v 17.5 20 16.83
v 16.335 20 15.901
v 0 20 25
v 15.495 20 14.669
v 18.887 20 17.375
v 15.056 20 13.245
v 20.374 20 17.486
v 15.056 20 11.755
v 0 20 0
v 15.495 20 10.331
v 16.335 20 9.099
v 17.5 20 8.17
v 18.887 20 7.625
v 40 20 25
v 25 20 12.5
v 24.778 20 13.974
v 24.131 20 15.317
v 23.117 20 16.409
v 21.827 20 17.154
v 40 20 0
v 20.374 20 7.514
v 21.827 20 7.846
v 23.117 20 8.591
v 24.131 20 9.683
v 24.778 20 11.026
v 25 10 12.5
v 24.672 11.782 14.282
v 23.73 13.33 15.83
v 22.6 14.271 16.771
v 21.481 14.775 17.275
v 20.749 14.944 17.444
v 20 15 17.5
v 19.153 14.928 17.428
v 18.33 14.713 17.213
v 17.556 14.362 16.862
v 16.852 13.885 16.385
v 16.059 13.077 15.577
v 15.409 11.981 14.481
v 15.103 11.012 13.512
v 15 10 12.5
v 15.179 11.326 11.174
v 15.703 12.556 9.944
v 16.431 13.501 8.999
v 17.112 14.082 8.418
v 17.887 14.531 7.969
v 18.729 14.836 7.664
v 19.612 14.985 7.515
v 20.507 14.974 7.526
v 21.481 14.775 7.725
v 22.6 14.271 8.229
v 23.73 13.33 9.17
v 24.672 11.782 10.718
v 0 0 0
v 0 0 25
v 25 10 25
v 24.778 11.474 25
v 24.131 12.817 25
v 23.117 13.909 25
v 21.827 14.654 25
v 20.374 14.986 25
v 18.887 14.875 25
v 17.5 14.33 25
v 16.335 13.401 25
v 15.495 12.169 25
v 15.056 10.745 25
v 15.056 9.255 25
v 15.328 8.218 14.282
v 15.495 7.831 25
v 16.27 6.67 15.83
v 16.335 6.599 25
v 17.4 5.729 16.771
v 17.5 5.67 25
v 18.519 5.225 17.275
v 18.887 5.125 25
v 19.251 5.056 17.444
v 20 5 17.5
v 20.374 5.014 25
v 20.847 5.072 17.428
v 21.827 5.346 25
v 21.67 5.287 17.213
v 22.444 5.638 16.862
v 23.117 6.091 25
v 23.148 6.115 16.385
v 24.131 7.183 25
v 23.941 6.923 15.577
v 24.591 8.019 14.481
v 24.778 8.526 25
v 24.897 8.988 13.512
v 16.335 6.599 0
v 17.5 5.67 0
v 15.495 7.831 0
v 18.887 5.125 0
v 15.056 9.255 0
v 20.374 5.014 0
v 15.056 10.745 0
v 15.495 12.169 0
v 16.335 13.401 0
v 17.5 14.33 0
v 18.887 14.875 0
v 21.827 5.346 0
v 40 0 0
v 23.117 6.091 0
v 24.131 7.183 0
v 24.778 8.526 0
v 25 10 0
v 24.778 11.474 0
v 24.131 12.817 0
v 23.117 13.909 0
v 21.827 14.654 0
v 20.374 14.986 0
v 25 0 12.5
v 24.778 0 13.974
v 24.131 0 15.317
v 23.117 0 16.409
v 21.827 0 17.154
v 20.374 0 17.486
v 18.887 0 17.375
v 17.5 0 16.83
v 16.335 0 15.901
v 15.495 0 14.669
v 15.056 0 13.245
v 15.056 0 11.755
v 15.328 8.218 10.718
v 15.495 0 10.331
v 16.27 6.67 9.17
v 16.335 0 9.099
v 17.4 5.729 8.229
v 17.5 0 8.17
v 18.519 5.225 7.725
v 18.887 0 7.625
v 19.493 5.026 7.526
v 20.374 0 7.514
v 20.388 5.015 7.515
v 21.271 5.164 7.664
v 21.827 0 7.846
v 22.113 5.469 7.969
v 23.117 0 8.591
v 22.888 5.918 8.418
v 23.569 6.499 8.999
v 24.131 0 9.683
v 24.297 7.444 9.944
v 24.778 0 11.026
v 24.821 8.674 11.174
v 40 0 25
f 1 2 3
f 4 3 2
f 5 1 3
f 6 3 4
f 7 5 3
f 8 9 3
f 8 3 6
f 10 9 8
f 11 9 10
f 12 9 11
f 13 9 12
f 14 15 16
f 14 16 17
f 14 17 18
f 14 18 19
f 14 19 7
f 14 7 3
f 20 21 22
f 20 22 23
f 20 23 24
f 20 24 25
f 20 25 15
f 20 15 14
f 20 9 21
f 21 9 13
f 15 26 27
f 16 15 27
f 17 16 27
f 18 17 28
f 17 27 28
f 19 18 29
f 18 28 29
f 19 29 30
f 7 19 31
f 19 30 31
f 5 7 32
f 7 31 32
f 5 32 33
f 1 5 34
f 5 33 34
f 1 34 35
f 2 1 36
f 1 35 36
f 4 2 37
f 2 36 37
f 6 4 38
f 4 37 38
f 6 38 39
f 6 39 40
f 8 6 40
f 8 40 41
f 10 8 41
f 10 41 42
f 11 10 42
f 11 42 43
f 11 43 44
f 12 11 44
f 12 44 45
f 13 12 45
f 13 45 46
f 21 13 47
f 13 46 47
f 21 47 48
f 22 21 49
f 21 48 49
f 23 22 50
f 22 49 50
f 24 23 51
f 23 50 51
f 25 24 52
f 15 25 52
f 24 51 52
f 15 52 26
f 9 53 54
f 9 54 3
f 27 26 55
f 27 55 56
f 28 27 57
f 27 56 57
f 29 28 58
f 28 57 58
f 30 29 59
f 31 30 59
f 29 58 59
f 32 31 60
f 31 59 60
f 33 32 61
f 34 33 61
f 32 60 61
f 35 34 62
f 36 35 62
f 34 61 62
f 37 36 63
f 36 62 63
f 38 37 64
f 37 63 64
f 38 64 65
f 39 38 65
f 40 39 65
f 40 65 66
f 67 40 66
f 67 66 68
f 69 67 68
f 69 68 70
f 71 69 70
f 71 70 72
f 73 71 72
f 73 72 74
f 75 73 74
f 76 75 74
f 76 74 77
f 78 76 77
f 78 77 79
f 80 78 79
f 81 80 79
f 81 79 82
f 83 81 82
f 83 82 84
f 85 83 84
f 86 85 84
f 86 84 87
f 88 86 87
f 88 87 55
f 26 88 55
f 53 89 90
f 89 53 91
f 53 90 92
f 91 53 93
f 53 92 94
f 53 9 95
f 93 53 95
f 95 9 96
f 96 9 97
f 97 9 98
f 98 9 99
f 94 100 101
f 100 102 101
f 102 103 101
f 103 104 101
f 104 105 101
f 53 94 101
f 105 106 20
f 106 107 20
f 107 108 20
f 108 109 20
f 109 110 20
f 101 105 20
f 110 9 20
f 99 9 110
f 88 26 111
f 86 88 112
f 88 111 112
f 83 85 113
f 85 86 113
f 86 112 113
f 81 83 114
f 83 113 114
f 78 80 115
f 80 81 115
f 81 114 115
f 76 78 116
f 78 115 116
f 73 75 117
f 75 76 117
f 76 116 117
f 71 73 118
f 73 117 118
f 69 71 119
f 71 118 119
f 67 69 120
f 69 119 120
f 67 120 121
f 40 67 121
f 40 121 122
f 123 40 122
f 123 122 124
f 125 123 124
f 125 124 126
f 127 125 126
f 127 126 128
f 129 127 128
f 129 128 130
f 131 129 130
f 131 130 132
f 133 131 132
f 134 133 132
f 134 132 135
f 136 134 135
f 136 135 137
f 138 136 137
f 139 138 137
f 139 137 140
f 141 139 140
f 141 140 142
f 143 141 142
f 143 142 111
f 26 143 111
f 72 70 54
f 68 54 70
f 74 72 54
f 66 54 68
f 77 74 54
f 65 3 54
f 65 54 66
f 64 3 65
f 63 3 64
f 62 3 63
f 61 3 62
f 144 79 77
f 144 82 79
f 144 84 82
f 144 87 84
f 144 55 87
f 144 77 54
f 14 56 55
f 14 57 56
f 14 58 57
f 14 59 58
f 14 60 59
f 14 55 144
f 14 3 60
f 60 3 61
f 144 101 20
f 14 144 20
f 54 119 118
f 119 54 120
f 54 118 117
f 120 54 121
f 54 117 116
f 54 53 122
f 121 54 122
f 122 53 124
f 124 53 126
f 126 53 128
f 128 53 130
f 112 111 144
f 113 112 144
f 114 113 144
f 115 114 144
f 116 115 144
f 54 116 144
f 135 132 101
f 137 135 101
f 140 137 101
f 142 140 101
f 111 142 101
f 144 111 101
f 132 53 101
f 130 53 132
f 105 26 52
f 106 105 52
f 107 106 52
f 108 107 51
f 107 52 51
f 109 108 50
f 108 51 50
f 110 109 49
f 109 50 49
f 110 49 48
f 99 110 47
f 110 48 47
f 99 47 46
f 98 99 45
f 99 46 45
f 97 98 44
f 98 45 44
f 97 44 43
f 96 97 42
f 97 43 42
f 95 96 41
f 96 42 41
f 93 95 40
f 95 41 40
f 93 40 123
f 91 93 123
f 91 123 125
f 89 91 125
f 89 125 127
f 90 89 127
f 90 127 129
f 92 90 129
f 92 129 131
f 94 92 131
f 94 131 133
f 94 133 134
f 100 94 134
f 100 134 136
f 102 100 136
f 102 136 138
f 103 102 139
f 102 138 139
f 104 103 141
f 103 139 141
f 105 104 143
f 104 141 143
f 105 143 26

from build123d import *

# Parameters (mm, degrees)
F0_W     = 40
F0_H     = 20
F1_DEPTH = 25
F2_R     = 5
F3_DEPTH = 25
F4_R     = 5
F5_DEPTH = 25


with BuildPart() as f1:
    # F0 (on Top) → F1 (new body)
    with BuildSketch(Plane.XY):
        with Locations((20, 10)):
            Rectangle(F0_W, F0_H)
    extrude(amount=F1_DEPTH)

    # F2 (on face) → F3 (cut)
    with BuildSketch(Plane.XY.offset(25)):
        with Locations((20, 10)):
            Circle(F2_R)
    extrude(amount=-F3_DEPTH, mode=Mode.SUBTRACT)

    # F4 (on face) → F5 (cut)
    with BuildSketch(Plane.XZ):
        with Locations((20, 12.5)):
            Circle(F4_R)
    extrude(amount=-F5_DEPTH, mode=Mode.SUBTRACT)


solid = f1.part
